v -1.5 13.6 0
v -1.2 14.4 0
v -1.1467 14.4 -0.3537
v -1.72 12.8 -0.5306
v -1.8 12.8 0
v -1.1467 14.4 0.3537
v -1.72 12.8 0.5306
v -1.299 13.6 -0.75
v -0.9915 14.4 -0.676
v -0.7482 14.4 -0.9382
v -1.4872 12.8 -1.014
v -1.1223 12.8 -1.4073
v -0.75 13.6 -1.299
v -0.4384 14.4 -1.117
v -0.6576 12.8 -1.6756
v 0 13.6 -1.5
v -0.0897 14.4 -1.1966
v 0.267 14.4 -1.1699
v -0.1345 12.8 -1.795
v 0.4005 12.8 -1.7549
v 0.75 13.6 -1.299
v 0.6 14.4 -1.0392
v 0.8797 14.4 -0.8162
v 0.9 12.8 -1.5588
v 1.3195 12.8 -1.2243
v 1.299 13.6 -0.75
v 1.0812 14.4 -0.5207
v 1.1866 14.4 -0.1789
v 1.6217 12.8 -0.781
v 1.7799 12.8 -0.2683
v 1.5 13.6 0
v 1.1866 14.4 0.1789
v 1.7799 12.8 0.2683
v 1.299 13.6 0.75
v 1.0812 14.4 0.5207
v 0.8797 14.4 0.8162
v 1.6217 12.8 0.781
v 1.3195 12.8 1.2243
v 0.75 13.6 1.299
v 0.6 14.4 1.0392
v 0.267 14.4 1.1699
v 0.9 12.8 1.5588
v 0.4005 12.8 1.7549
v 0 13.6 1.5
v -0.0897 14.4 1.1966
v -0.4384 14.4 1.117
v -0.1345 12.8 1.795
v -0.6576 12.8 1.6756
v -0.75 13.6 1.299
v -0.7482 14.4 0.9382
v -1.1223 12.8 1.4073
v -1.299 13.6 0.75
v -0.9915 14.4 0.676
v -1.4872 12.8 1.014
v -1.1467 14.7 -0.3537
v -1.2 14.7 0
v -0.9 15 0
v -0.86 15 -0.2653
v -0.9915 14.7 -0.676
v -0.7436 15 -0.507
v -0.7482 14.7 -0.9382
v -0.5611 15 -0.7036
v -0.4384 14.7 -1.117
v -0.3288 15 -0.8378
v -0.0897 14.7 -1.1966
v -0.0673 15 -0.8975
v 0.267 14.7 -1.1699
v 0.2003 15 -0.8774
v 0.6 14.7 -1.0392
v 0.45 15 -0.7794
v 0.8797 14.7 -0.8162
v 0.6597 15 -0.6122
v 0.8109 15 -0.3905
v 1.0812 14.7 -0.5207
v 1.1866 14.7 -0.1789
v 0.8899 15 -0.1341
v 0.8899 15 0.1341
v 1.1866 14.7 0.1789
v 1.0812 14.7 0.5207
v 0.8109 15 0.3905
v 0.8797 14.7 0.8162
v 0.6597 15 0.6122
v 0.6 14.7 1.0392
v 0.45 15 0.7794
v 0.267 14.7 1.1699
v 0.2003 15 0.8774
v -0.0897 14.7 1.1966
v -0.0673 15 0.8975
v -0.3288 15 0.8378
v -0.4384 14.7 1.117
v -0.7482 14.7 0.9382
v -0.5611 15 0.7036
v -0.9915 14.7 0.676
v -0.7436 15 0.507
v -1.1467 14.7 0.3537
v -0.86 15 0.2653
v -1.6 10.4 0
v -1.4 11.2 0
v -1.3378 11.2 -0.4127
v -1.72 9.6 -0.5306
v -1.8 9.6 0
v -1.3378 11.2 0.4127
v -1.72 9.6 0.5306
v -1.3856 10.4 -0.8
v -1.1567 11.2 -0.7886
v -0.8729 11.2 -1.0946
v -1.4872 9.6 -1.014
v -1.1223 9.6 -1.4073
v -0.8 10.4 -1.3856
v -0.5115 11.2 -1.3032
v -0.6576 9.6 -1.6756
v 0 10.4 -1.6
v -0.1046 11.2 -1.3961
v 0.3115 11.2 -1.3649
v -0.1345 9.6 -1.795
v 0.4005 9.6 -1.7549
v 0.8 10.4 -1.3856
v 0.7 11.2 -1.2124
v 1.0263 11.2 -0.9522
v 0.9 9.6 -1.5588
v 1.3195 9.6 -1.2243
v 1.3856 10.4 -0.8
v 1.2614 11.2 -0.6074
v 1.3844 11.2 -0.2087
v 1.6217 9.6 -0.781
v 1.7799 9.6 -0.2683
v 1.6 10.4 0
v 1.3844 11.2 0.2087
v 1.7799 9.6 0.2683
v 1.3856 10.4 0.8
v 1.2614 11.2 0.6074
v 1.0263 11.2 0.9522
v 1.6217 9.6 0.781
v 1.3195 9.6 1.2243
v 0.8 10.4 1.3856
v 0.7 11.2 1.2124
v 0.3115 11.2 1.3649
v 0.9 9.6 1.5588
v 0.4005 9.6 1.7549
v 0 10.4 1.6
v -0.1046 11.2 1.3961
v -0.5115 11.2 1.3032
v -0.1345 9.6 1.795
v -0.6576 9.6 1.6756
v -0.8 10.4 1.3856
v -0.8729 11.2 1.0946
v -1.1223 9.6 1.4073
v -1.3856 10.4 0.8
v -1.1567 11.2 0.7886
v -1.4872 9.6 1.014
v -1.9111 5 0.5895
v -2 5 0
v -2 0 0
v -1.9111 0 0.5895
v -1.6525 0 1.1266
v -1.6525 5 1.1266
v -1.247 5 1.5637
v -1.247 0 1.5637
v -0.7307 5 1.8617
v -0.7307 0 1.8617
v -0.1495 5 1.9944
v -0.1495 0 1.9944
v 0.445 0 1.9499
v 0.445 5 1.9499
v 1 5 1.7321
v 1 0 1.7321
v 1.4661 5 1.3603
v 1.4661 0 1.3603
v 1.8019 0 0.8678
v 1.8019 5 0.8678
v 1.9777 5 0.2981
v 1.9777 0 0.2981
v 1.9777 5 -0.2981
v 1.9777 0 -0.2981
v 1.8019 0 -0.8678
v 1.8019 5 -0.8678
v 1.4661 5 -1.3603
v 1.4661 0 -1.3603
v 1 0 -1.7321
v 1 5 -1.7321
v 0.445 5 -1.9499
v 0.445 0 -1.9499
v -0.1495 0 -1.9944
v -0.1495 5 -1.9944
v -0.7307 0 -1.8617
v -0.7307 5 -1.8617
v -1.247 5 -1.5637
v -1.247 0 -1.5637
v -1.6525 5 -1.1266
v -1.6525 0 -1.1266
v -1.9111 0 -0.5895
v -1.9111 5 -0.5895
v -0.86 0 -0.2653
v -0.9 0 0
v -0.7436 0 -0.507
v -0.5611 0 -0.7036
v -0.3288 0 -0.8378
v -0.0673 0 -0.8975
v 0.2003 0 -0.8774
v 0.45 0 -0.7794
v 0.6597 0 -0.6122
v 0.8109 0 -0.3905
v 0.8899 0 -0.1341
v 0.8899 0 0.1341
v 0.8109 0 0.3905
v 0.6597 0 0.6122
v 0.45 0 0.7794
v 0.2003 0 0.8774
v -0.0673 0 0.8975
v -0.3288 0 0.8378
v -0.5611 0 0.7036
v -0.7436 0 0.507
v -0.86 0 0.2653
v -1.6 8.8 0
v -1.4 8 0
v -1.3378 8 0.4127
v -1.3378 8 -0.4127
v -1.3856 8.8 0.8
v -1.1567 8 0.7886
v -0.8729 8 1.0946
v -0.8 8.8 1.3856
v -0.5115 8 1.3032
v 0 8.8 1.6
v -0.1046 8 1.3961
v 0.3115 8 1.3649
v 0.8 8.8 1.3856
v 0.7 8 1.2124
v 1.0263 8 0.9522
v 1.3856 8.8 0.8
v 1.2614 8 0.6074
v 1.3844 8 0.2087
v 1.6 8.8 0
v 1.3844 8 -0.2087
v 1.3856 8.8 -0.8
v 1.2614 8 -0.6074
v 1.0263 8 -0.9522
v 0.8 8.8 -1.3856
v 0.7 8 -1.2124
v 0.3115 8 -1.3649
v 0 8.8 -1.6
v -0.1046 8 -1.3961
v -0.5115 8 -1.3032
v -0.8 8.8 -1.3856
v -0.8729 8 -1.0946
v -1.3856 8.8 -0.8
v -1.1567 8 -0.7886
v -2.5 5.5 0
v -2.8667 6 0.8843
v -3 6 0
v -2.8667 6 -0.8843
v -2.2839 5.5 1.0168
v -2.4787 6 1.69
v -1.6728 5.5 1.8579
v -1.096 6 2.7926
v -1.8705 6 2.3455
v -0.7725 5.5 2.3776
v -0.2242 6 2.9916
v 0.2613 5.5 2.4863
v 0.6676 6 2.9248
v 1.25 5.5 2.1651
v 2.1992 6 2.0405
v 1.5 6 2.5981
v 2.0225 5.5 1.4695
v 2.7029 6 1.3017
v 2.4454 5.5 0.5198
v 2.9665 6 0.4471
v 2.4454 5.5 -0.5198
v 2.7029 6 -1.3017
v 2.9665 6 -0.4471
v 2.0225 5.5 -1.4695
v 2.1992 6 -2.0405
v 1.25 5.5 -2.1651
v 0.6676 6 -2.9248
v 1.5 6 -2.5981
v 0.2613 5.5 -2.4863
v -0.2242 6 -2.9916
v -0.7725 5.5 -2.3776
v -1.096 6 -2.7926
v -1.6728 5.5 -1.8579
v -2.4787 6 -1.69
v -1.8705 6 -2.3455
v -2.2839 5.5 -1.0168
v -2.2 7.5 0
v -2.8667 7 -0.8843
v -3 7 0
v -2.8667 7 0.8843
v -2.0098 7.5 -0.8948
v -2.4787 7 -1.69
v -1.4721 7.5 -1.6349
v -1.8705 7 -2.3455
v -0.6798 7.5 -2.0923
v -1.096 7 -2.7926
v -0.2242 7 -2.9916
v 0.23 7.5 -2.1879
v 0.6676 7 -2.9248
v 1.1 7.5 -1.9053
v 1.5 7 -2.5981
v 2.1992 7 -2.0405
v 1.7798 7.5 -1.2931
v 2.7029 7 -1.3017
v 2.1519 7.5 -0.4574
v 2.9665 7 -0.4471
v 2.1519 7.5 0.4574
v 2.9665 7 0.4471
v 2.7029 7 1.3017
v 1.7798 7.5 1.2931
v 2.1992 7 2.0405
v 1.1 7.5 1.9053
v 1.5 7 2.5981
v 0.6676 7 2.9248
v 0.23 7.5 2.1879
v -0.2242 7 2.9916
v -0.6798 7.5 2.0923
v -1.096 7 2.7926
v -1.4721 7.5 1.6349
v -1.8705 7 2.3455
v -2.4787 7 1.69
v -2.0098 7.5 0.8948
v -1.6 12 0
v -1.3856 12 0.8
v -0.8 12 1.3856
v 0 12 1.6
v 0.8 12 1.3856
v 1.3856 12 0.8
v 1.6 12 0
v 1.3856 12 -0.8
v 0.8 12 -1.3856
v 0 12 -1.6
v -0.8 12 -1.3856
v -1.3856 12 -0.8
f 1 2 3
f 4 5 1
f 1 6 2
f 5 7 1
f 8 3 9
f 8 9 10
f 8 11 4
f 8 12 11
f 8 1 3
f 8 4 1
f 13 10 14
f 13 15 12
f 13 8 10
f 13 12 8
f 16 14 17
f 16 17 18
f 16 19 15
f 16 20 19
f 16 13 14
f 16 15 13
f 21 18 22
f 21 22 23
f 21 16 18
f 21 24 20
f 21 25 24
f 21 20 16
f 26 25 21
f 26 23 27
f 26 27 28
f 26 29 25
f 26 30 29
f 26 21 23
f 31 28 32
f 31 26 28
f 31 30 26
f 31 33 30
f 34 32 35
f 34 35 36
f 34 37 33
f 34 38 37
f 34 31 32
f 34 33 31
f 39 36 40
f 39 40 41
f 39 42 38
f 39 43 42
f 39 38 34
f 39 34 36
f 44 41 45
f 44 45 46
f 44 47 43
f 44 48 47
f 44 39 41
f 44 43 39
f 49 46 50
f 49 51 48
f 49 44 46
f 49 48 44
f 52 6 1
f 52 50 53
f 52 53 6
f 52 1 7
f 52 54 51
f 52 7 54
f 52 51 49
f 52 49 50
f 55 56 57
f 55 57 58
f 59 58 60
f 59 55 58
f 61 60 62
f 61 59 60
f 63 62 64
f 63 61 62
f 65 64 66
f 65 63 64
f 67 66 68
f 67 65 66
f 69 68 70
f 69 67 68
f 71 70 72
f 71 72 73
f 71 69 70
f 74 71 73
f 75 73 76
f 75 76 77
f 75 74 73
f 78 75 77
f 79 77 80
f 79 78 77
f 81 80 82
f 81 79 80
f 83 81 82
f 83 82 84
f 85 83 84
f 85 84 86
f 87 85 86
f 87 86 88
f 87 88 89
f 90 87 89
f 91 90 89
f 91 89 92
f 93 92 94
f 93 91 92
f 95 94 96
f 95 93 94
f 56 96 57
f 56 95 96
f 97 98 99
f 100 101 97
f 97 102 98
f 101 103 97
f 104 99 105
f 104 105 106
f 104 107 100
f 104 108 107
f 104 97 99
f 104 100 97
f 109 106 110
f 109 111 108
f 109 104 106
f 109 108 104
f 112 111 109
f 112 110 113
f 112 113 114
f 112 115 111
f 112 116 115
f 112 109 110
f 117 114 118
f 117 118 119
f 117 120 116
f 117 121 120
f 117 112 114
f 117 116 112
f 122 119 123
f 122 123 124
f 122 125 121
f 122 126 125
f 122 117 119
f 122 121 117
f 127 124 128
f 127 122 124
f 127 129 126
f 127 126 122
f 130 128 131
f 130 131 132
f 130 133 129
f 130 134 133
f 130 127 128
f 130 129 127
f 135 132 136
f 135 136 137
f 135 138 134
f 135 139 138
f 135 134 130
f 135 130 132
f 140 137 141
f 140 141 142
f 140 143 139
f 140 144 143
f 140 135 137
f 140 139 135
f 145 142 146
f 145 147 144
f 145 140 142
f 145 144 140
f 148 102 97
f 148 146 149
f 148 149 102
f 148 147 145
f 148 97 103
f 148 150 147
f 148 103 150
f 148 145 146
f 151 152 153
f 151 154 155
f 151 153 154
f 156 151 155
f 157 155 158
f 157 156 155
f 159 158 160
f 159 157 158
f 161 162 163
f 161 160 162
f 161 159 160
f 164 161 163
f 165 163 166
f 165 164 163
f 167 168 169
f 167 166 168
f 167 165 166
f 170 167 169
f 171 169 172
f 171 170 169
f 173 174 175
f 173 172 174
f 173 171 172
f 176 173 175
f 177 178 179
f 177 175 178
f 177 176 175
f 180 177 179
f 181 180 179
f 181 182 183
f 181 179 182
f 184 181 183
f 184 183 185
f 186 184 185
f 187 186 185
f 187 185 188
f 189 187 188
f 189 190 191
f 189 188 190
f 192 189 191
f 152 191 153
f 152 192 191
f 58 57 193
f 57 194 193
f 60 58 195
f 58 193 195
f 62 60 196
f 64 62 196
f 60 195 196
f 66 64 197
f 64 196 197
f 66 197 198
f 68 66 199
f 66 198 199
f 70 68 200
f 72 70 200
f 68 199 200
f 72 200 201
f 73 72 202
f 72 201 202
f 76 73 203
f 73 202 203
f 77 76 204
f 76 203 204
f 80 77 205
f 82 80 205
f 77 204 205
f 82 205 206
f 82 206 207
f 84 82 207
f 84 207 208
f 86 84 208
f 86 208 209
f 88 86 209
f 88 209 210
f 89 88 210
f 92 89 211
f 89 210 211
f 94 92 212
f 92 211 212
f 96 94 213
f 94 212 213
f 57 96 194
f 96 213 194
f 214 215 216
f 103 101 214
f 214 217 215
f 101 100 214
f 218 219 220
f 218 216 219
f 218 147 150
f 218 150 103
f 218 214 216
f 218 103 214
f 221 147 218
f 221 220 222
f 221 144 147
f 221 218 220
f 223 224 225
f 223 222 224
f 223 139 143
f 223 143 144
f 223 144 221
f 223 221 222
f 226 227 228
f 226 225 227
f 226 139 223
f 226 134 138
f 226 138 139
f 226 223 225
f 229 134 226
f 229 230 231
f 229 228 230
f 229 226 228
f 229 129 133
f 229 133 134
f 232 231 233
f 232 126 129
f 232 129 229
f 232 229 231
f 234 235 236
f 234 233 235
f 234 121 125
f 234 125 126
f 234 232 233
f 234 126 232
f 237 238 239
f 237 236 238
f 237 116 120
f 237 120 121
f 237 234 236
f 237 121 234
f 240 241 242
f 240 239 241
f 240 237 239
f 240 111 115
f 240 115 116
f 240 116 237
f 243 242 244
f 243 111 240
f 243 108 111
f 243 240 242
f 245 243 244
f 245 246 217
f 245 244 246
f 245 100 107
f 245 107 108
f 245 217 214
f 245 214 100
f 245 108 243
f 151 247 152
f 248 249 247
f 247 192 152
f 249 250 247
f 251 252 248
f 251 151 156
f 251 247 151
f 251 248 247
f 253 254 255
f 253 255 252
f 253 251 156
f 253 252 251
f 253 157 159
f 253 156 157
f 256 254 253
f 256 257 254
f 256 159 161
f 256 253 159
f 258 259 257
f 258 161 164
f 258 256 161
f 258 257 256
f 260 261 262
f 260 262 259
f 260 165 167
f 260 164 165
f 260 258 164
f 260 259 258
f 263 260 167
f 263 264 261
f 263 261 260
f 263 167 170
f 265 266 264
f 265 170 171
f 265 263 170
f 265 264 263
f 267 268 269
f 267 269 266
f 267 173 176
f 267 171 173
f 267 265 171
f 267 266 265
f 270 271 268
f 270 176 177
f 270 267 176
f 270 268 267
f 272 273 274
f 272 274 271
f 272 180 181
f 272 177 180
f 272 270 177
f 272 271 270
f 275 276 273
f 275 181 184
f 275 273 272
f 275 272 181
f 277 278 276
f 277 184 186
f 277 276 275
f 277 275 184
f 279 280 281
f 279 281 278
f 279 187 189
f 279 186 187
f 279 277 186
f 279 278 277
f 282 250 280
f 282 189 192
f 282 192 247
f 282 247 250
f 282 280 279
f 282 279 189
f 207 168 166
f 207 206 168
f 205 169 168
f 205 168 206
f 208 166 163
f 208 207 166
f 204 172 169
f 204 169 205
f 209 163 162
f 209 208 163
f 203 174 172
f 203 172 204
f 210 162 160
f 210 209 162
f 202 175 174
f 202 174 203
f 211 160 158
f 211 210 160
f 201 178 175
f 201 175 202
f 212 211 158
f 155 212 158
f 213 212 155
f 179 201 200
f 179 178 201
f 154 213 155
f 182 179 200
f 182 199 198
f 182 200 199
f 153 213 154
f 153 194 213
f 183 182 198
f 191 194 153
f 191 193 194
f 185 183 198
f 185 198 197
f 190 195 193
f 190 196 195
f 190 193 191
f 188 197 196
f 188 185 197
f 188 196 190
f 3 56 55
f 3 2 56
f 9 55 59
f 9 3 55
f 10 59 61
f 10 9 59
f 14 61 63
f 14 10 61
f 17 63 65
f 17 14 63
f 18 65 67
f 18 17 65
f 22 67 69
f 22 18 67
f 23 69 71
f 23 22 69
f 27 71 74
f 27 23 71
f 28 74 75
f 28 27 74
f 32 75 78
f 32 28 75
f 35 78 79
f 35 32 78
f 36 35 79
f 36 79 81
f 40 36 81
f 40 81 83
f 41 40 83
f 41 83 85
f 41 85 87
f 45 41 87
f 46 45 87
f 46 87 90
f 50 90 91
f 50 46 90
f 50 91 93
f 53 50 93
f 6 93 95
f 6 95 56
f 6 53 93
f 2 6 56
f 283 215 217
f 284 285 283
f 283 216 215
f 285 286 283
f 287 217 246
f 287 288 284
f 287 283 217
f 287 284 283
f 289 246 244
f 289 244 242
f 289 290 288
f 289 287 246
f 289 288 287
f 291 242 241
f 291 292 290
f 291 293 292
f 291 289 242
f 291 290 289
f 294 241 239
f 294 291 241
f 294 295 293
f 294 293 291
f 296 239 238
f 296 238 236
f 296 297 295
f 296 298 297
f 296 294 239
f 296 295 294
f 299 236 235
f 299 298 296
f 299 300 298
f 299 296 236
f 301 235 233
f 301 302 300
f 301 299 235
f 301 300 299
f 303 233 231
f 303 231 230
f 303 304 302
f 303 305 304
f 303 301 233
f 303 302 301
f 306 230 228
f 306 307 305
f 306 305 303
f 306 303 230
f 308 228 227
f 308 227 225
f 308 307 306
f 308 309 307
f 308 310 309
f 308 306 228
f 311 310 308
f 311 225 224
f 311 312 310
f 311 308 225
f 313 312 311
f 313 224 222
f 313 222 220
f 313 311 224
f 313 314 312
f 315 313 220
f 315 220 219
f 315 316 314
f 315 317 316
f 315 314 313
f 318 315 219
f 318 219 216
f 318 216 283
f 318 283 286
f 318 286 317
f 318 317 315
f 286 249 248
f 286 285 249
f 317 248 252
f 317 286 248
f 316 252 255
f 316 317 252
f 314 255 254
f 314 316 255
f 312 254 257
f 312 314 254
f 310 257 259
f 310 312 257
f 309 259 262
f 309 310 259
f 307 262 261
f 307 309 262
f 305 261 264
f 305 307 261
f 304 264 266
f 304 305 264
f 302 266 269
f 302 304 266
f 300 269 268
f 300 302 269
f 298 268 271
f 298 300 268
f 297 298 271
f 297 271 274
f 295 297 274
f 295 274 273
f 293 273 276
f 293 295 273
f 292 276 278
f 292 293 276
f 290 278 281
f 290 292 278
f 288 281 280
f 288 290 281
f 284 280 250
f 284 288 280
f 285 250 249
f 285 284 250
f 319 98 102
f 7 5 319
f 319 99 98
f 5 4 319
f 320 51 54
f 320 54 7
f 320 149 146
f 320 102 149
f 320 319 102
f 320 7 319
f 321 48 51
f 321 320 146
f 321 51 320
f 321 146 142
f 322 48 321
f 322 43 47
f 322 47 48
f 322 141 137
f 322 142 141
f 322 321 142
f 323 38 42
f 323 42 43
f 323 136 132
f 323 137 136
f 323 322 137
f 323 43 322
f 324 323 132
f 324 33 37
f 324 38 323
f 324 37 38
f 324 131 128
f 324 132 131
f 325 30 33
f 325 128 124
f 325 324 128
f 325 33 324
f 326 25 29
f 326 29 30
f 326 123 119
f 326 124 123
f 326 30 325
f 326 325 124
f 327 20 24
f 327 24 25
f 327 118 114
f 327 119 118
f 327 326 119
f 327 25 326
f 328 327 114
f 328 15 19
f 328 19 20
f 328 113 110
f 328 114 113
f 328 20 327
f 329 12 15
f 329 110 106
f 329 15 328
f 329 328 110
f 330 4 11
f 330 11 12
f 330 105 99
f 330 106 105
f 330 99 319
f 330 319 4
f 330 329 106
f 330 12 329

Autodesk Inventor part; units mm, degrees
ref_plane "YZ Plane" through (0, 0, 0) normal (1, 0, 0) x (0, 1, 0)
ref_plane "XZ Plane" through (0, 0, 0) normal (0, 1, 0) x (-1, 0, 0)
ref_plane "XY Plane" through (0, 0, 0) normal (0, 0, 1) x (1, 0, 0)
sketch "Sketch1" plane through (0, 0, 0) normal (0, 0, 1) x (1, 0, 0)
  line L0 (-2, 0) -> (-2, 5)
  line L1 (-2, 5) -> (-3, 6)
  line L2 (-3, 6) -> (-3, 7)
  line L3 (-3, 7) -> (-1.4, 8)
  line L4 (-0.9, 15) -> (-0.9, 0)
  line L5 (-0.9, 0) -> (-2, 0)
  line L6 (0, 18) -> (0, -3) construction
  line L7 (-3.6, 0) -> (0.6, 0) construction
  line L8 (-0.9, 15) -> (-1.2, 14.7)
  line L9 (-1.2, 14.7) -> (-1.2, 14.4)
  line L10 (-1.2, 14.4) -> (-1.8, 12.8)
  line L11 (-1.8, 12.8) -> (-1.4, 11.2)
  line L12 (-1.4, 11.2) -> (-1.8, 9.6)
  line L13 (-1.8, 9.6) -> (-1.4, 8)
  point P0 (0, 0)
  point P1 (-2, 2.5)
  dimension "d0" = 15
  dimension "d4" = 1
  dimension "d5" = 0.9
  dimension "d6" = 1.8
  dimension "d9" = 5
  dimension "d10" = 1
  dimension "d11" = 1
  dimension "d12" = 2.5
  dimension "d14" = 2
  dimension "d15" = 1.2
  dimension "d16" = 1.8
  dimension "d17" = 3
  dimension "d18" = 45
  dimension "d19" = 0.3
  dimension "d20" = 1.4
  dimension "d21" = 1.4
  dimension "d22" = 1.6
  dimension "d23" = 1.6
  dimension "d24" = 1.6
revolve "Revolution1" add sketch "Sketch1" angle 360 about axis through (0, 0, 0) along (0, -1, 0)
properties part number "Thread to Barbed 3-32 inch and 10-32 hole"
